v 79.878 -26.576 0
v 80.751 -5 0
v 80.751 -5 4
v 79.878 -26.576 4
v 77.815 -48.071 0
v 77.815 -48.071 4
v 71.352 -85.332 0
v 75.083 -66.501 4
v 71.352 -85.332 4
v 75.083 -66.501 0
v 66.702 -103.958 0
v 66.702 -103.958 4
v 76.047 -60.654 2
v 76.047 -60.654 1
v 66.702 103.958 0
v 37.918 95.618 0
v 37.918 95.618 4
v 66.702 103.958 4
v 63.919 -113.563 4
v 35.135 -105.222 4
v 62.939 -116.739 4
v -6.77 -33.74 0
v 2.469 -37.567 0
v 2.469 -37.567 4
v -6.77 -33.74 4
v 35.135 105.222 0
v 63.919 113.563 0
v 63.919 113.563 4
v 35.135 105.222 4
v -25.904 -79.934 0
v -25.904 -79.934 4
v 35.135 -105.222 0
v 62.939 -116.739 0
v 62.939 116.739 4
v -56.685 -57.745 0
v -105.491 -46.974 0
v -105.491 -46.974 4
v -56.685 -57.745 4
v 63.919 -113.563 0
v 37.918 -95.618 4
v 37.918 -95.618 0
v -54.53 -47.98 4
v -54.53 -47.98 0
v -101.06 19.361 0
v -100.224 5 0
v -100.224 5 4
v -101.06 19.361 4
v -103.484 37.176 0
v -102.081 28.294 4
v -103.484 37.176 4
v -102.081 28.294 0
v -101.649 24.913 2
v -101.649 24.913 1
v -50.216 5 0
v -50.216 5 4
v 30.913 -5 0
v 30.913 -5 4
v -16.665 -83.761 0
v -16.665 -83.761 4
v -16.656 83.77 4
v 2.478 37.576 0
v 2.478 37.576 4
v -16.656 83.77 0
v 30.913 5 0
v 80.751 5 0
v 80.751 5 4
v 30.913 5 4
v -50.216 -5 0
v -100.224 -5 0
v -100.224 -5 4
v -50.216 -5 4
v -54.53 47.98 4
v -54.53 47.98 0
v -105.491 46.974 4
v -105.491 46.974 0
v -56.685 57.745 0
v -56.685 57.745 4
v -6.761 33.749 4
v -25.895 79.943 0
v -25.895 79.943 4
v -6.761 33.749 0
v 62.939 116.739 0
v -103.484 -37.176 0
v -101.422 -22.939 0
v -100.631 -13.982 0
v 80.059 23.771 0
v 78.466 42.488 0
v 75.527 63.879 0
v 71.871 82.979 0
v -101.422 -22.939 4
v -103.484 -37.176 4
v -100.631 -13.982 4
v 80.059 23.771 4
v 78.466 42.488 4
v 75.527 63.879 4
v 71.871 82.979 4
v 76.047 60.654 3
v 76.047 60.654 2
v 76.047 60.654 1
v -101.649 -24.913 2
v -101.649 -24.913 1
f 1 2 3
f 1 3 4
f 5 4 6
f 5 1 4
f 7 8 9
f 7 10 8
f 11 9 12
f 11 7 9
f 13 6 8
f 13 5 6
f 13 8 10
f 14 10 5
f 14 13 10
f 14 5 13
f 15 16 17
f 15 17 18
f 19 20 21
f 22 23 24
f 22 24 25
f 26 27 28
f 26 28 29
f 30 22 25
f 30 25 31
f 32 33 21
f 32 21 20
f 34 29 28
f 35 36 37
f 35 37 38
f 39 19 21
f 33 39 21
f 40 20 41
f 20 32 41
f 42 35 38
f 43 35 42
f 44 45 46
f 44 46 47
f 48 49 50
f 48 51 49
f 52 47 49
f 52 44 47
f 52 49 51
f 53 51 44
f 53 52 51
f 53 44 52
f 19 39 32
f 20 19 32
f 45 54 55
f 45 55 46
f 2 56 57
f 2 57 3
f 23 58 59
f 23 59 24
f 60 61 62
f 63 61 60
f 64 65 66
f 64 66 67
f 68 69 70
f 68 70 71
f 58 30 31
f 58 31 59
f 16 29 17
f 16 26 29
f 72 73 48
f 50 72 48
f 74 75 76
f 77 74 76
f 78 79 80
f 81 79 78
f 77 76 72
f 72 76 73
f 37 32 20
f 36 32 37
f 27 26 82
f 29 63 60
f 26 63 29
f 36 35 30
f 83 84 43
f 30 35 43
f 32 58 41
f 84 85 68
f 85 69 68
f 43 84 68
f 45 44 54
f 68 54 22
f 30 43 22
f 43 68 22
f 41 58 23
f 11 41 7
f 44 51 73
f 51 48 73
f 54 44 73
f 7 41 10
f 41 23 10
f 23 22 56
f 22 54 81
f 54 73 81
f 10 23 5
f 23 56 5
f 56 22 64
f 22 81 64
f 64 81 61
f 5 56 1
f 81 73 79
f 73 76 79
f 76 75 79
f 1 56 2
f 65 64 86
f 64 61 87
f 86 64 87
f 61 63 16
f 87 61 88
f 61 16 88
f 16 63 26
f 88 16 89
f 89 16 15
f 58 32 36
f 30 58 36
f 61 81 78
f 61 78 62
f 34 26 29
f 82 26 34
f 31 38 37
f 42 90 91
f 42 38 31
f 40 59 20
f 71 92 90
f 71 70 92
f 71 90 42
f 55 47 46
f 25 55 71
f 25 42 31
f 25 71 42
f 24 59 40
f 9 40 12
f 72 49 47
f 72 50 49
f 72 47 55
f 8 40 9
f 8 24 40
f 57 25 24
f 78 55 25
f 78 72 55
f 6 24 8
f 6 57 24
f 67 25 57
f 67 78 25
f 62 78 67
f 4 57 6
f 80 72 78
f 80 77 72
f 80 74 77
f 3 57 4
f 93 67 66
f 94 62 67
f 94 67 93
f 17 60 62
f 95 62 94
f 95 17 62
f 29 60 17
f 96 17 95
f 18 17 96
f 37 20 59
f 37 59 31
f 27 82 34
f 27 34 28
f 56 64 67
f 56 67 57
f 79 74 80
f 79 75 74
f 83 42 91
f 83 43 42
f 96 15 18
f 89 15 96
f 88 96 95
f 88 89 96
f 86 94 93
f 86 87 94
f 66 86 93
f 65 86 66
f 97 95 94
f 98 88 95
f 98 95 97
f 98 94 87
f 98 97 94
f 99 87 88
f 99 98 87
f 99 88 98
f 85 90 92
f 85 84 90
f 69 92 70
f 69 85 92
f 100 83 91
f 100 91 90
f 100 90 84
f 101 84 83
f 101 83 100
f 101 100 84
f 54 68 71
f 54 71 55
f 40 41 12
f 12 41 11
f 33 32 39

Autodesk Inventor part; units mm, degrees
ref_plane "YZ Plane" through (0, 0, 0) normal (1, 0, 0) x (0, 1, 0)
ref_plane "XZ Plane" through (0, 0, 0) normal (0, 1, 0) x (-1, 0, 0)
ref_plane "Work Plane1" through (0, 0, 0) normal (0, 0, 1) x (1, 0, 0)
sketch "Sketch2" plane through (0, 0, 0) normal (0, 0, 1) x (1, 0, 0)
  spline S0 degree 3 poles (62.9391, 116.7394) (68.6793, 98.401) (73.0646, 79.638) (79.1979, 40.5999) (80.7828, 20.2998) (80.7828, 0) (80.7828, -20.2998) (79.1979, -40.5999) (73.0646, -79.638) (68.6793, -98.401) (62.9391, -116.7394) knots -24.034595 -24.034595 -24.034595 -24.034595 -18.269852 -18.269852 -12.179902 -12.179902 -12.179902 -6.089951 -6.089951 -0.325208 -0.325208 -0.325208 -0.325208 projected
  spline S1 degree 3 poles (-105.4906, -46.9736) (-103.8187, -39.6955) (-102.5357, -32.328) (-100.6605, -16.6479) (-100.1646, -8.324) (-100.1646, 0) (-100.1646, 8.324) (-100.6605, 16.6479) (-102.5357, 32.328) (-103.8187, 39.6955) (-105.4906, 46.9736) knots -9.731856 -9.731856 -9.731856 -9.731856 -7.491562 -7.491562 -4.994375 -4.994375 -4.994375 -2.497187 -2.497187 -0.256894 -0.256894 -0.256894 -0.256894 projected
  line L0 (62.9391, -116.7394) -> (-105.4906, -46.9736)
  line L1 (-105.4906, 46.9736) -> (62.9391, 116.7394)
  point P0 (0, 0)
extrude "Extrusion2" add sketch "Sketch2" along normal blind 4
sketch "Sketch3" plane through (0, 0, 0) normal (0, 0, -1) x (-1, 0, 0)
  line L0 (50.2161, -5) -> (50.2161, 5)
  line L1 (50.2161, 5) -> (101.2252, 5)
  line L2 (101.2252, 5) -> (101.2252, -5)
  line L3 (101.2252, -5) -> (50.2161, -5)
  line L4 (56.6852, -57.7449) -> (54.5301, -47.9799)
  line L5 (54.5301, -47.9799) -> (104.3389, -36.9871)
  line L6 (104.3389, -36.9871) -> (106.4941, -46.7521)
  line L7 (106.4941, -46.7521) -> (56.6852, -57.7449)
  line L8 (-2.4688, -37.5673) -> (6.77, -33.7404)
  line L9 (6.77, -33.7404) -> (25.9042, -79.9344)
  line L10 (25.9042, -79.9344) -> (16.6654, -83.7613)
  line L11 (16.6654, -83.7613) -> (-2.4688, -37.5673)
  line L12 (6.761, 33.7491) -> (-2.4778, 37.576)
  line L13 (-2.4778, 37.576) -> (16.6564, 83.7699)
  line L14 (16.6564, 83.7699) -> (25.8952, 79.9431)
  line L15 (25.8952, 79.9431) -> (6.761, 33.7491)
  line L16 (-30.9132, 5.0001) -> (-30.9132, -4.9999)
  line L17 (-30.9132, -4.9999) -> (-81.9207, -4.9999)
  line L18 (-81.9207, -4.9999) -> (-81.9207, 5.0001)
  line L19 (-81.9207, 5.0001) -> (-30.9132, 5.0001)
  line L20 (0, 0) -> (-130.3795, 0) construction
  line L21 (56.6852, 57.7449) -> (54.5301, 47.9799)
  line L22 (54.5301, 47.9799) -> (104.3389, 36.9871)
  line L23 (104.3389, 36.9871) -> (106.4941, 46.7521)
  line L24 (106.4941, 46.7521) -> (56.6852, 57.7449)
extrude "Extrusion3" cut sketch "Sketch3" against normal through all
sketch "Sketch4" plane through (0, 0, 0) normal (0, 0, -1) x (-1, 0, 0)
  line L0 (-63.9494, -113.5716) -> (-35.1346, -105.2224)
  line L1 (-35.1346, -105.2224) -> (-37.9176, -95.6175)
  line L2 (-37.9176, -95.6175) -> (-66.7324, -103.9667)
  line L3 (-66.7324, -103.9667) -> (-63.9494, -113.5716)
  line L4 (-62.9391, -116.7394) -> (105.4906, -46.9736) construction
  line L5 (0, 0) -> (-102.4259, 0) construction
  line L6 (-63.9494, 113.5716) -> (-35.1346, 105.2224)
  line L7 (-35.1346, 105.2224) -> (-37.9176, 95.6175)
  line L8 (-37.9176, 95.6175) -> (-66.7324, 103.9667)
  line L9 (-66.7324, 103.9667) -> (-63.9494, 113.5716)
  point P0 (-80.7508, -4.9999)
  point P1 (-65.3409, -108.7691)
  point P2 (-62.9391, 116.7394)
  point P3 (-65.3409, 108.7691)
  dimension "d21" = 30
  dimension "d22" = 10
extrude "Extrusion4" cut sketch "Sketch4" against normal through all
properties part number "internalSupportTop1" material "Wood (Cherry)"
